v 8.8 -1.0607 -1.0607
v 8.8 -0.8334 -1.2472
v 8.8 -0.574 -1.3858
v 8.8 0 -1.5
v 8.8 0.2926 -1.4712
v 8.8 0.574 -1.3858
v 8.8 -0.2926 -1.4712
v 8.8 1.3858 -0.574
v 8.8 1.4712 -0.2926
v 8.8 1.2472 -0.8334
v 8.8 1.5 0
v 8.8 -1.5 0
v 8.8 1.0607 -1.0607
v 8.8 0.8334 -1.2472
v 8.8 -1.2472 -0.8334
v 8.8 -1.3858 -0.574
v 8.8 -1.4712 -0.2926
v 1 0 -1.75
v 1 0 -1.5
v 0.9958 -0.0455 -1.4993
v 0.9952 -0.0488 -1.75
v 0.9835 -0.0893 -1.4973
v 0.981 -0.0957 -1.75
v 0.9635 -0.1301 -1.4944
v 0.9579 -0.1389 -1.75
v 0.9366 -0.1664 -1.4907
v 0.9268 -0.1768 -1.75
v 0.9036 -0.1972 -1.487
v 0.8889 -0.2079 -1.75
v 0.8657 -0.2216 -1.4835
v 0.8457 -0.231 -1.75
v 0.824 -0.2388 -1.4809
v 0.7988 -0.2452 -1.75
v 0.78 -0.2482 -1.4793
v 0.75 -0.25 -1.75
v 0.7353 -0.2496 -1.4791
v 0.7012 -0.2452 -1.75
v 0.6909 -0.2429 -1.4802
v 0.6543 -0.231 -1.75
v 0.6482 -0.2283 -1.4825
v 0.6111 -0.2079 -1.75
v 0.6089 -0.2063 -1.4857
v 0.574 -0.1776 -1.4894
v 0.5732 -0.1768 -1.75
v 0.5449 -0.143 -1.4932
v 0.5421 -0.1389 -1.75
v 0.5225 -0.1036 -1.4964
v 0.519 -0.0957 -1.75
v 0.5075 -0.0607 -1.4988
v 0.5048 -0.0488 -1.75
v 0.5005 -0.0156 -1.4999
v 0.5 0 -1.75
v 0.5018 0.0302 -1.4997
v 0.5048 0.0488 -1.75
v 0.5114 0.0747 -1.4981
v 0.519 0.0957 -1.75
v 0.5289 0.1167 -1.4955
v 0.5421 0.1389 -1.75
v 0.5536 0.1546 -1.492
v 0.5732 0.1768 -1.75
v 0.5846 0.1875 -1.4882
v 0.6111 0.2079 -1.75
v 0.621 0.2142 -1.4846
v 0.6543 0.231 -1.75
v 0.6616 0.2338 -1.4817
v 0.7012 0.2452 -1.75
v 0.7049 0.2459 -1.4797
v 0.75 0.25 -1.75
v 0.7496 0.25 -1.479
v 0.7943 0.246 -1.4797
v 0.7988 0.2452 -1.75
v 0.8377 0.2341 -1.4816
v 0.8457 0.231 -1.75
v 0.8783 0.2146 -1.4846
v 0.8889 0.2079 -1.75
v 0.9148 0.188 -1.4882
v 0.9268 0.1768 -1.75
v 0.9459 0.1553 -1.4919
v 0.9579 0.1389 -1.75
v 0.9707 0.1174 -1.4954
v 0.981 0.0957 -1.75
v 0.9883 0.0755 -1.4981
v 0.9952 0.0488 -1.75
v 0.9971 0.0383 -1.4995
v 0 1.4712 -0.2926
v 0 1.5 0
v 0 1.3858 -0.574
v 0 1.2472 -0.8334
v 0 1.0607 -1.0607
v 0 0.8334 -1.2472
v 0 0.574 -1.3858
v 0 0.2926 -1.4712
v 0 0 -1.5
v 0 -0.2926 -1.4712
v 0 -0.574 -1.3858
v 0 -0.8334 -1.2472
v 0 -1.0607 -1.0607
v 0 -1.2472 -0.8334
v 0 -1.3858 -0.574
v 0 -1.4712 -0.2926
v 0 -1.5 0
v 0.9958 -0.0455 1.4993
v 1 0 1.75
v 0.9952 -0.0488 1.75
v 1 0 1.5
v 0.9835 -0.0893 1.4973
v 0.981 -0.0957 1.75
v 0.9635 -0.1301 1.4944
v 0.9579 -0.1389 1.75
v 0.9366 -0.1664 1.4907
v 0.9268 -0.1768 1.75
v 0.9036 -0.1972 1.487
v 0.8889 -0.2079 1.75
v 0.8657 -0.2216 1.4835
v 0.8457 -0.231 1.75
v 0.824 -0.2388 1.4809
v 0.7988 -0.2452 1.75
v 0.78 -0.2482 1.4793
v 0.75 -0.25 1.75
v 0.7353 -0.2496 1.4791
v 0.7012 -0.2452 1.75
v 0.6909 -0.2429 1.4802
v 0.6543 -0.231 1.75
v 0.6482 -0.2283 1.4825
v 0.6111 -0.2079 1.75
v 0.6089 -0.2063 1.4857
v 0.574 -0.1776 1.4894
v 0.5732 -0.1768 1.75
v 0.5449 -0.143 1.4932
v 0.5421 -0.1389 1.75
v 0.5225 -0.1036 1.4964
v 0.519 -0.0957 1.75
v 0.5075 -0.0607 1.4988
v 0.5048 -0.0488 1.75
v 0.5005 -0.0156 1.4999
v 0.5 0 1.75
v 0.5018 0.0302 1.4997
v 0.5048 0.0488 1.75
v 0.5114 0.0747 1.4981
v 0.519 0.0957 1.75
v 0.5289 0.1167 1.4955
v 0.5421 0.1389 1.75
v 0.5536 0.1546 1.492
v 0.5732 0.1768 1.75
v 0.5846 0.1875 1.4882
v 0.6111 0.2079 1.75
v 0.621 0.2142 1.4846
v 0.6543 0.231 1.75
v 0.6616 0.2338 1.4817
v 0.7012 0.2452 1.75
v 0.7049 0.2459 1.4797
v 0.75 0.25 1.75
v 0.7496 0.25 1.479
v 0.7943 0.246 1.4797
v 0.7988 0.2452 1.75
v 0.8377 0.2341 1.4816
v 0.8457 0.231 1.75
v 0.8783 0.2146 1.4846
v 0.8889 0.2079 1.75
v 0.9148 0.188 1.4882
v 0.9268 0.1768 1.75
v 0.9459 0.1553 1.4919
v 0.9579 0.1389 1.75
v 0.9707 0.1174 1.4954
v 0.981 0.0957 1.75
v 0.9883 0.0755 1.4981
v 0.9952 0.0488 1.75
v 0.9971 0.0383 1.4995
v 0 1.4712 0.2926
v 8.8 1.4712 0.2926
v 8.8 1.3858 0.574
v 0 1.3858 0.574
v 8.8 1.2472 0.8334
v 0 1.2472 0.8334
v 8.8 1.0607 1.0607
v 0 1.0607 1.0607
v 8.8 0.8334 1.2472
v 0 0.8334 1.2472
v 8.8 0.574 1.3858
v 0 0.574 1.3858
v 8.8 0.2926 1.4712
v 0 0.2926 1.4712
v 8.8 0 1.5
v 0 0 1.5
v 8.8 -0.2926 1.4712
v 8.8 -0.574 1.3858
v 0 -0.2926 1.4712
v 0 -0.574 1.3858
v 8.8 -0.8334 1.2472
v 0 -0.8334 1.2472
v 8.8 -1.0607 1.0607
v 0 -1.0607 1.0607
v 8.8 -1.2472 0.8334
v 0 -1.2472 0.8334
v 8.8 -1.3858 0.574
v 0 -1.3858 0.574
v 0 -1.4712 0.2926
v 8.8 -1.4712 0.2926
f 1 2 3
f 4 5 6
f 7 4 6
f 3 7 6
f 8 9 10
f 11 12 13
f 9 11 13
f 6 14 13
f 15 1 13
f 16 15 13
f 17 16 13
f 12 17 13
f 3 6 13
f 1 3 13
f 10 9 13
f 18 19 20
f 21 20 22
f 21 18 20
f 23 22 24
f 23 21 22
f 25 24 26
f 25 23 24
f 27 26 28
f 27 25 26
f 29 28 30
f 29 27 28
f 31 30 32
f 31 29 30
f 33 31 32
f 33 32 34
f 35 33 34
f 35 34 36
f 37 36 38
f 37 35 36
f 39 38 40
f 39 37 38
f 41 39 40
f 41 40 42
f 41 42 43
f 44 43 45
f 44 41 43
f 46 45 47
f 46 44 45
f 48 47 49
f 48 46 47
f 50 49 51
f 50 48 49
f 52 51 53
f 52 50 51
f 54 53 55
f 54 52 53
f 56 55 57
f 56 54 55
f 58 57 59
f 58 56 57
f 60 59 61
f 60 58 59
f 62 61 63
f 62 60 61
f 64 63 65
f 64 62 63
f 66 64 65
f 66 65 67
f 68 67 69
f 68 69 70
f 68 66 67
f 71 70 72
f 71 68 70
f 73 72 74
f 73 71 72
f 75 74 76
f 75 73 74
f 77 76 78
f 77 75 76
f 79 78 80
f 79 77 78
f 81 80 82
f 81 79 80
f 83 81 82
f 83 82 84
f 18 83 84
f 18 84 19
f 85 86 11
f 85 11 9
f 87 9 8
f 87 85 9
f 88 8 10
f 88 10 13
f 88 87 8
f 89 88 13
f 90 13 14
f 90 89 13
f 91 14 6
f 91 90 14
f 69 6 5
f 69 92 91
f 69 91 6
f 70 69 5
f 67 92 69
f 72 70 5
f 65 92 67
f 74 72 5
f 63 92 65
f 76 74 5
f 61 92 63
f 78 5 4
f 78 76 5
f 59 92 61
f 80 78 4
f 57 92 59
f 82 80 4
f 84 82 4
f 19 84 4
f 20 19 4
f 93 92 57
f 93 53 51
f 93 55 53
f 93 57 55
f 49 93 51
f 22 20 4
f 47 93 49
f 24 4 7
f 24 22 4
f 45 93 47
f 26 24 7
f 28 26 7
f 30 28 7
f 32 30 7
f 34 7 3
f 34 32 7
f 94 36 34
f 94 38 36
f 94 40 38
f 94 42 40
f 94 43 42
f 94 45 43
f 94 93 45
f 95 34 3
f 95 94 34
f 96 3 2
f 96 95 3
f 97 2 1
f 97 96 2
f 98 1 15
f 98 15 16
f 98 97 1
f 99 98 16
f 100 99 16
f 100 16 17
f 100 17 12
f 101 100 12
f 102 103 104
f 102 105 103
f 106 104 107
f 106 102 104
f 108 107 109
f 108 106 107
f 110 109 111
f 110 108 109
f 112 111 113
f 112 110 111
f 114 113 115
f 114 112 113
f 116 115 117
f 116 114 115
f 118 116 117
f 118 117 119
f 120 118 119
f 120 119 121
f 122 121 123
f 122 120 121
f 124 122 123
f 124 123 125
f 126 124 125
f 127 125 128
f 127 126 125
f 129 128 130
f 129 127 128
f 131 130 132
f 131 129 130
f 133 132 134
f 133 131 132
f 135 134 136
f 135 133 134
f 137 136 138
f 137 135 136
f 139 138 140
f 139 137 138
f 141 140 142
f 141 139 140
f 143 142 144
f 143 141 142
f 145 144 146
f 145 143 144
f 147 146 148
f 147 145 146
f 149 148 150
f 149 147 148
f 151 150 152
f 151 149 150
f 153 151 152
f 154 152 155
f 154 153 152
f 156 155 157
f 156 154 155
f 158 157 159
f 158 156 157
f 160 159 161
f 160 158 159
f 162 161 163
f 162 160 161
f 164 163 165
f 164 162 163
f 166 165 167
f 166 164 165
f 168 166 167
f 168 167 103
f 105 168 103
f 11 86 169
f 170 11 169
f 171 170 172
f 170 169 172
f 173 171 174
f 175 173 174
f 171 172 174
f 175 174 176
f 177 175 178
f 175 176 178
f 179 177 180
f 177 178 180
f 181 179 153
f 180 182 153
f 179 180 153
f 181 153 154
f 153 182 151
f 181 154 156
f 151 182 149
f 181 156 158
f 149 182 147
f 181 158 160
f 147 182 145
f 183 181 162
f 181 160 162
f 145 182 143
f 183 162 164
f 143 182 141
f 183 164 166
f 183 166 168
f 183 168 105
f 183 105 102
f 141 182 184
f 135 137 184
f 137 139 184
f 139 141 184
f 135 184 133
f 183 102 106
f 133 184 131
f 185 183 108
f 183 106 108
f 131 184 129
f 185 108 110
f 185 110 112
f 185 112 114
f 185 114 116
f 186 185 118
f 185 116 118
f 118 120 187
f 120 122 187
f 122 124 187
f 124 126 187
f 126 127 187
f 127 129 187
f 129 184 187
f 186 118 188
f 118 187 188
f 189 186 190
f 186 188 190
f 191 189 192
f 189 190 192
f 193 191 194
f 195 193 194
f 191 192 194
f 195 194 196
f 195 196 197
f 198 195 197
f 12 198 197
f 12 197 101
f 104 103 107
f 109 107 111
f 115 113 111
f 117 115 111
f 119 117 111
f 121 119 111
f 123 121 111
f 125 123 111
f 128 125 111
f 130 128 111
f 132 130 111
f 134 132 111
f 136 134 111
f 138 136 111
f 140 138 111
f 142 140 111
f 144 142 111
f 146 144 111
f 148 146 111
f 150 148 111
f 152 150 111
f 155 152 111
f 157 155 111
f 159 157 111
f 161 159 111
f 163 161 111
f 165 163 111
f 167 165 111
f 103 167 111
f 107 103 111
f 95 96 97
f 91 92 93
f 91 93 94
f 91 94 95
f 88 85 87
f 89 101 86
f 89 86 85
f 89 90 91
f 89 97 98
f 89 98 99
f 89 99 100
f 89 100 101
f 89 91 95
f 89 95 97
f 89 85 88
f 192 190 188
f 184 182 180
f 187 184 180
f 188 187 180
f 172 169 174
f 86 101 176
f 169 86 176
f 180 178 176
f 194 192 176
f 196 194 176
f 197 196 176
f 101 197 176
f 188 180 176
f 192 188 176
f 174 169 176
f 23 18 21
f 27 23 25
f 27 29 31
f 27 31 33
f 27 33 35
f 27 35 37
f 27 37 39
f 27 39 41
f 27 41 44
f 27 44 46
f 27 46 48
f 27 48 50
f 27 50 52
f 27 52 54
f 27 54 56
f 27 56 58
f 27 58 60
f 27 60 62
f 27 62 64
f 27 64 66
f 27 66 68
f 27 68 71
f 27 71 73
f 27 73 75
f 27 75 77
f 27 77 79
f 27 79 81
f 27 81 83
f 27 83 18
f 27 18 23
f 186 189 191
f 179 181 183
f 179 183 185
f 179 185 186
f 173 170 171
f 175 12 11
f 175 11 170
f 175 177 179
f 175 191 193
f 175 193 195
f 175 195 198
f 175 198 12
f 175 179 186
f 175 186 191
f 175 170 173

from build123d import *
from build123d import SkipClean  # not in build123d's __all__

# Parameters (mm, degrees)
F1_DEPTH = 8.8
F2_R     = 0.25
F3_DEPTH = 1.75


with BuildPart() as f1:
    # F0 (on Right) → F1 (new body)
    with BuildSketch(Plane.YZ):
        with BuildLine():
            Line((-1.5, 0), (1.5, 0))
            ThreePointArc((1.5, 0), (0, 1.5), (-1.5, 0))
        make_face()
    extrude(amount=F1_DEPTH)

    # F2 (on face) → F3 (join, symmetric)
    with BuildSketch(Plane(origin=(0, 0, 0), x_dir=(1, 0, 0), z_dir=(0, 0, -1))):
        with Locations((0.75, 0)):
            Circle(F2_R)
    extrude(amount=F3_DEPTH, both=True)

    # F4: F1 across plane


with BuildPart() as f1_1:
    add(f1.part, clean=False)
    with SkipClean():  # cleaning this boolean's faces spoils the solid; the shape is the same uncleaned
        add(f1.part.mirror(Plane.XY), clean=False)


solid = f1_1.part
